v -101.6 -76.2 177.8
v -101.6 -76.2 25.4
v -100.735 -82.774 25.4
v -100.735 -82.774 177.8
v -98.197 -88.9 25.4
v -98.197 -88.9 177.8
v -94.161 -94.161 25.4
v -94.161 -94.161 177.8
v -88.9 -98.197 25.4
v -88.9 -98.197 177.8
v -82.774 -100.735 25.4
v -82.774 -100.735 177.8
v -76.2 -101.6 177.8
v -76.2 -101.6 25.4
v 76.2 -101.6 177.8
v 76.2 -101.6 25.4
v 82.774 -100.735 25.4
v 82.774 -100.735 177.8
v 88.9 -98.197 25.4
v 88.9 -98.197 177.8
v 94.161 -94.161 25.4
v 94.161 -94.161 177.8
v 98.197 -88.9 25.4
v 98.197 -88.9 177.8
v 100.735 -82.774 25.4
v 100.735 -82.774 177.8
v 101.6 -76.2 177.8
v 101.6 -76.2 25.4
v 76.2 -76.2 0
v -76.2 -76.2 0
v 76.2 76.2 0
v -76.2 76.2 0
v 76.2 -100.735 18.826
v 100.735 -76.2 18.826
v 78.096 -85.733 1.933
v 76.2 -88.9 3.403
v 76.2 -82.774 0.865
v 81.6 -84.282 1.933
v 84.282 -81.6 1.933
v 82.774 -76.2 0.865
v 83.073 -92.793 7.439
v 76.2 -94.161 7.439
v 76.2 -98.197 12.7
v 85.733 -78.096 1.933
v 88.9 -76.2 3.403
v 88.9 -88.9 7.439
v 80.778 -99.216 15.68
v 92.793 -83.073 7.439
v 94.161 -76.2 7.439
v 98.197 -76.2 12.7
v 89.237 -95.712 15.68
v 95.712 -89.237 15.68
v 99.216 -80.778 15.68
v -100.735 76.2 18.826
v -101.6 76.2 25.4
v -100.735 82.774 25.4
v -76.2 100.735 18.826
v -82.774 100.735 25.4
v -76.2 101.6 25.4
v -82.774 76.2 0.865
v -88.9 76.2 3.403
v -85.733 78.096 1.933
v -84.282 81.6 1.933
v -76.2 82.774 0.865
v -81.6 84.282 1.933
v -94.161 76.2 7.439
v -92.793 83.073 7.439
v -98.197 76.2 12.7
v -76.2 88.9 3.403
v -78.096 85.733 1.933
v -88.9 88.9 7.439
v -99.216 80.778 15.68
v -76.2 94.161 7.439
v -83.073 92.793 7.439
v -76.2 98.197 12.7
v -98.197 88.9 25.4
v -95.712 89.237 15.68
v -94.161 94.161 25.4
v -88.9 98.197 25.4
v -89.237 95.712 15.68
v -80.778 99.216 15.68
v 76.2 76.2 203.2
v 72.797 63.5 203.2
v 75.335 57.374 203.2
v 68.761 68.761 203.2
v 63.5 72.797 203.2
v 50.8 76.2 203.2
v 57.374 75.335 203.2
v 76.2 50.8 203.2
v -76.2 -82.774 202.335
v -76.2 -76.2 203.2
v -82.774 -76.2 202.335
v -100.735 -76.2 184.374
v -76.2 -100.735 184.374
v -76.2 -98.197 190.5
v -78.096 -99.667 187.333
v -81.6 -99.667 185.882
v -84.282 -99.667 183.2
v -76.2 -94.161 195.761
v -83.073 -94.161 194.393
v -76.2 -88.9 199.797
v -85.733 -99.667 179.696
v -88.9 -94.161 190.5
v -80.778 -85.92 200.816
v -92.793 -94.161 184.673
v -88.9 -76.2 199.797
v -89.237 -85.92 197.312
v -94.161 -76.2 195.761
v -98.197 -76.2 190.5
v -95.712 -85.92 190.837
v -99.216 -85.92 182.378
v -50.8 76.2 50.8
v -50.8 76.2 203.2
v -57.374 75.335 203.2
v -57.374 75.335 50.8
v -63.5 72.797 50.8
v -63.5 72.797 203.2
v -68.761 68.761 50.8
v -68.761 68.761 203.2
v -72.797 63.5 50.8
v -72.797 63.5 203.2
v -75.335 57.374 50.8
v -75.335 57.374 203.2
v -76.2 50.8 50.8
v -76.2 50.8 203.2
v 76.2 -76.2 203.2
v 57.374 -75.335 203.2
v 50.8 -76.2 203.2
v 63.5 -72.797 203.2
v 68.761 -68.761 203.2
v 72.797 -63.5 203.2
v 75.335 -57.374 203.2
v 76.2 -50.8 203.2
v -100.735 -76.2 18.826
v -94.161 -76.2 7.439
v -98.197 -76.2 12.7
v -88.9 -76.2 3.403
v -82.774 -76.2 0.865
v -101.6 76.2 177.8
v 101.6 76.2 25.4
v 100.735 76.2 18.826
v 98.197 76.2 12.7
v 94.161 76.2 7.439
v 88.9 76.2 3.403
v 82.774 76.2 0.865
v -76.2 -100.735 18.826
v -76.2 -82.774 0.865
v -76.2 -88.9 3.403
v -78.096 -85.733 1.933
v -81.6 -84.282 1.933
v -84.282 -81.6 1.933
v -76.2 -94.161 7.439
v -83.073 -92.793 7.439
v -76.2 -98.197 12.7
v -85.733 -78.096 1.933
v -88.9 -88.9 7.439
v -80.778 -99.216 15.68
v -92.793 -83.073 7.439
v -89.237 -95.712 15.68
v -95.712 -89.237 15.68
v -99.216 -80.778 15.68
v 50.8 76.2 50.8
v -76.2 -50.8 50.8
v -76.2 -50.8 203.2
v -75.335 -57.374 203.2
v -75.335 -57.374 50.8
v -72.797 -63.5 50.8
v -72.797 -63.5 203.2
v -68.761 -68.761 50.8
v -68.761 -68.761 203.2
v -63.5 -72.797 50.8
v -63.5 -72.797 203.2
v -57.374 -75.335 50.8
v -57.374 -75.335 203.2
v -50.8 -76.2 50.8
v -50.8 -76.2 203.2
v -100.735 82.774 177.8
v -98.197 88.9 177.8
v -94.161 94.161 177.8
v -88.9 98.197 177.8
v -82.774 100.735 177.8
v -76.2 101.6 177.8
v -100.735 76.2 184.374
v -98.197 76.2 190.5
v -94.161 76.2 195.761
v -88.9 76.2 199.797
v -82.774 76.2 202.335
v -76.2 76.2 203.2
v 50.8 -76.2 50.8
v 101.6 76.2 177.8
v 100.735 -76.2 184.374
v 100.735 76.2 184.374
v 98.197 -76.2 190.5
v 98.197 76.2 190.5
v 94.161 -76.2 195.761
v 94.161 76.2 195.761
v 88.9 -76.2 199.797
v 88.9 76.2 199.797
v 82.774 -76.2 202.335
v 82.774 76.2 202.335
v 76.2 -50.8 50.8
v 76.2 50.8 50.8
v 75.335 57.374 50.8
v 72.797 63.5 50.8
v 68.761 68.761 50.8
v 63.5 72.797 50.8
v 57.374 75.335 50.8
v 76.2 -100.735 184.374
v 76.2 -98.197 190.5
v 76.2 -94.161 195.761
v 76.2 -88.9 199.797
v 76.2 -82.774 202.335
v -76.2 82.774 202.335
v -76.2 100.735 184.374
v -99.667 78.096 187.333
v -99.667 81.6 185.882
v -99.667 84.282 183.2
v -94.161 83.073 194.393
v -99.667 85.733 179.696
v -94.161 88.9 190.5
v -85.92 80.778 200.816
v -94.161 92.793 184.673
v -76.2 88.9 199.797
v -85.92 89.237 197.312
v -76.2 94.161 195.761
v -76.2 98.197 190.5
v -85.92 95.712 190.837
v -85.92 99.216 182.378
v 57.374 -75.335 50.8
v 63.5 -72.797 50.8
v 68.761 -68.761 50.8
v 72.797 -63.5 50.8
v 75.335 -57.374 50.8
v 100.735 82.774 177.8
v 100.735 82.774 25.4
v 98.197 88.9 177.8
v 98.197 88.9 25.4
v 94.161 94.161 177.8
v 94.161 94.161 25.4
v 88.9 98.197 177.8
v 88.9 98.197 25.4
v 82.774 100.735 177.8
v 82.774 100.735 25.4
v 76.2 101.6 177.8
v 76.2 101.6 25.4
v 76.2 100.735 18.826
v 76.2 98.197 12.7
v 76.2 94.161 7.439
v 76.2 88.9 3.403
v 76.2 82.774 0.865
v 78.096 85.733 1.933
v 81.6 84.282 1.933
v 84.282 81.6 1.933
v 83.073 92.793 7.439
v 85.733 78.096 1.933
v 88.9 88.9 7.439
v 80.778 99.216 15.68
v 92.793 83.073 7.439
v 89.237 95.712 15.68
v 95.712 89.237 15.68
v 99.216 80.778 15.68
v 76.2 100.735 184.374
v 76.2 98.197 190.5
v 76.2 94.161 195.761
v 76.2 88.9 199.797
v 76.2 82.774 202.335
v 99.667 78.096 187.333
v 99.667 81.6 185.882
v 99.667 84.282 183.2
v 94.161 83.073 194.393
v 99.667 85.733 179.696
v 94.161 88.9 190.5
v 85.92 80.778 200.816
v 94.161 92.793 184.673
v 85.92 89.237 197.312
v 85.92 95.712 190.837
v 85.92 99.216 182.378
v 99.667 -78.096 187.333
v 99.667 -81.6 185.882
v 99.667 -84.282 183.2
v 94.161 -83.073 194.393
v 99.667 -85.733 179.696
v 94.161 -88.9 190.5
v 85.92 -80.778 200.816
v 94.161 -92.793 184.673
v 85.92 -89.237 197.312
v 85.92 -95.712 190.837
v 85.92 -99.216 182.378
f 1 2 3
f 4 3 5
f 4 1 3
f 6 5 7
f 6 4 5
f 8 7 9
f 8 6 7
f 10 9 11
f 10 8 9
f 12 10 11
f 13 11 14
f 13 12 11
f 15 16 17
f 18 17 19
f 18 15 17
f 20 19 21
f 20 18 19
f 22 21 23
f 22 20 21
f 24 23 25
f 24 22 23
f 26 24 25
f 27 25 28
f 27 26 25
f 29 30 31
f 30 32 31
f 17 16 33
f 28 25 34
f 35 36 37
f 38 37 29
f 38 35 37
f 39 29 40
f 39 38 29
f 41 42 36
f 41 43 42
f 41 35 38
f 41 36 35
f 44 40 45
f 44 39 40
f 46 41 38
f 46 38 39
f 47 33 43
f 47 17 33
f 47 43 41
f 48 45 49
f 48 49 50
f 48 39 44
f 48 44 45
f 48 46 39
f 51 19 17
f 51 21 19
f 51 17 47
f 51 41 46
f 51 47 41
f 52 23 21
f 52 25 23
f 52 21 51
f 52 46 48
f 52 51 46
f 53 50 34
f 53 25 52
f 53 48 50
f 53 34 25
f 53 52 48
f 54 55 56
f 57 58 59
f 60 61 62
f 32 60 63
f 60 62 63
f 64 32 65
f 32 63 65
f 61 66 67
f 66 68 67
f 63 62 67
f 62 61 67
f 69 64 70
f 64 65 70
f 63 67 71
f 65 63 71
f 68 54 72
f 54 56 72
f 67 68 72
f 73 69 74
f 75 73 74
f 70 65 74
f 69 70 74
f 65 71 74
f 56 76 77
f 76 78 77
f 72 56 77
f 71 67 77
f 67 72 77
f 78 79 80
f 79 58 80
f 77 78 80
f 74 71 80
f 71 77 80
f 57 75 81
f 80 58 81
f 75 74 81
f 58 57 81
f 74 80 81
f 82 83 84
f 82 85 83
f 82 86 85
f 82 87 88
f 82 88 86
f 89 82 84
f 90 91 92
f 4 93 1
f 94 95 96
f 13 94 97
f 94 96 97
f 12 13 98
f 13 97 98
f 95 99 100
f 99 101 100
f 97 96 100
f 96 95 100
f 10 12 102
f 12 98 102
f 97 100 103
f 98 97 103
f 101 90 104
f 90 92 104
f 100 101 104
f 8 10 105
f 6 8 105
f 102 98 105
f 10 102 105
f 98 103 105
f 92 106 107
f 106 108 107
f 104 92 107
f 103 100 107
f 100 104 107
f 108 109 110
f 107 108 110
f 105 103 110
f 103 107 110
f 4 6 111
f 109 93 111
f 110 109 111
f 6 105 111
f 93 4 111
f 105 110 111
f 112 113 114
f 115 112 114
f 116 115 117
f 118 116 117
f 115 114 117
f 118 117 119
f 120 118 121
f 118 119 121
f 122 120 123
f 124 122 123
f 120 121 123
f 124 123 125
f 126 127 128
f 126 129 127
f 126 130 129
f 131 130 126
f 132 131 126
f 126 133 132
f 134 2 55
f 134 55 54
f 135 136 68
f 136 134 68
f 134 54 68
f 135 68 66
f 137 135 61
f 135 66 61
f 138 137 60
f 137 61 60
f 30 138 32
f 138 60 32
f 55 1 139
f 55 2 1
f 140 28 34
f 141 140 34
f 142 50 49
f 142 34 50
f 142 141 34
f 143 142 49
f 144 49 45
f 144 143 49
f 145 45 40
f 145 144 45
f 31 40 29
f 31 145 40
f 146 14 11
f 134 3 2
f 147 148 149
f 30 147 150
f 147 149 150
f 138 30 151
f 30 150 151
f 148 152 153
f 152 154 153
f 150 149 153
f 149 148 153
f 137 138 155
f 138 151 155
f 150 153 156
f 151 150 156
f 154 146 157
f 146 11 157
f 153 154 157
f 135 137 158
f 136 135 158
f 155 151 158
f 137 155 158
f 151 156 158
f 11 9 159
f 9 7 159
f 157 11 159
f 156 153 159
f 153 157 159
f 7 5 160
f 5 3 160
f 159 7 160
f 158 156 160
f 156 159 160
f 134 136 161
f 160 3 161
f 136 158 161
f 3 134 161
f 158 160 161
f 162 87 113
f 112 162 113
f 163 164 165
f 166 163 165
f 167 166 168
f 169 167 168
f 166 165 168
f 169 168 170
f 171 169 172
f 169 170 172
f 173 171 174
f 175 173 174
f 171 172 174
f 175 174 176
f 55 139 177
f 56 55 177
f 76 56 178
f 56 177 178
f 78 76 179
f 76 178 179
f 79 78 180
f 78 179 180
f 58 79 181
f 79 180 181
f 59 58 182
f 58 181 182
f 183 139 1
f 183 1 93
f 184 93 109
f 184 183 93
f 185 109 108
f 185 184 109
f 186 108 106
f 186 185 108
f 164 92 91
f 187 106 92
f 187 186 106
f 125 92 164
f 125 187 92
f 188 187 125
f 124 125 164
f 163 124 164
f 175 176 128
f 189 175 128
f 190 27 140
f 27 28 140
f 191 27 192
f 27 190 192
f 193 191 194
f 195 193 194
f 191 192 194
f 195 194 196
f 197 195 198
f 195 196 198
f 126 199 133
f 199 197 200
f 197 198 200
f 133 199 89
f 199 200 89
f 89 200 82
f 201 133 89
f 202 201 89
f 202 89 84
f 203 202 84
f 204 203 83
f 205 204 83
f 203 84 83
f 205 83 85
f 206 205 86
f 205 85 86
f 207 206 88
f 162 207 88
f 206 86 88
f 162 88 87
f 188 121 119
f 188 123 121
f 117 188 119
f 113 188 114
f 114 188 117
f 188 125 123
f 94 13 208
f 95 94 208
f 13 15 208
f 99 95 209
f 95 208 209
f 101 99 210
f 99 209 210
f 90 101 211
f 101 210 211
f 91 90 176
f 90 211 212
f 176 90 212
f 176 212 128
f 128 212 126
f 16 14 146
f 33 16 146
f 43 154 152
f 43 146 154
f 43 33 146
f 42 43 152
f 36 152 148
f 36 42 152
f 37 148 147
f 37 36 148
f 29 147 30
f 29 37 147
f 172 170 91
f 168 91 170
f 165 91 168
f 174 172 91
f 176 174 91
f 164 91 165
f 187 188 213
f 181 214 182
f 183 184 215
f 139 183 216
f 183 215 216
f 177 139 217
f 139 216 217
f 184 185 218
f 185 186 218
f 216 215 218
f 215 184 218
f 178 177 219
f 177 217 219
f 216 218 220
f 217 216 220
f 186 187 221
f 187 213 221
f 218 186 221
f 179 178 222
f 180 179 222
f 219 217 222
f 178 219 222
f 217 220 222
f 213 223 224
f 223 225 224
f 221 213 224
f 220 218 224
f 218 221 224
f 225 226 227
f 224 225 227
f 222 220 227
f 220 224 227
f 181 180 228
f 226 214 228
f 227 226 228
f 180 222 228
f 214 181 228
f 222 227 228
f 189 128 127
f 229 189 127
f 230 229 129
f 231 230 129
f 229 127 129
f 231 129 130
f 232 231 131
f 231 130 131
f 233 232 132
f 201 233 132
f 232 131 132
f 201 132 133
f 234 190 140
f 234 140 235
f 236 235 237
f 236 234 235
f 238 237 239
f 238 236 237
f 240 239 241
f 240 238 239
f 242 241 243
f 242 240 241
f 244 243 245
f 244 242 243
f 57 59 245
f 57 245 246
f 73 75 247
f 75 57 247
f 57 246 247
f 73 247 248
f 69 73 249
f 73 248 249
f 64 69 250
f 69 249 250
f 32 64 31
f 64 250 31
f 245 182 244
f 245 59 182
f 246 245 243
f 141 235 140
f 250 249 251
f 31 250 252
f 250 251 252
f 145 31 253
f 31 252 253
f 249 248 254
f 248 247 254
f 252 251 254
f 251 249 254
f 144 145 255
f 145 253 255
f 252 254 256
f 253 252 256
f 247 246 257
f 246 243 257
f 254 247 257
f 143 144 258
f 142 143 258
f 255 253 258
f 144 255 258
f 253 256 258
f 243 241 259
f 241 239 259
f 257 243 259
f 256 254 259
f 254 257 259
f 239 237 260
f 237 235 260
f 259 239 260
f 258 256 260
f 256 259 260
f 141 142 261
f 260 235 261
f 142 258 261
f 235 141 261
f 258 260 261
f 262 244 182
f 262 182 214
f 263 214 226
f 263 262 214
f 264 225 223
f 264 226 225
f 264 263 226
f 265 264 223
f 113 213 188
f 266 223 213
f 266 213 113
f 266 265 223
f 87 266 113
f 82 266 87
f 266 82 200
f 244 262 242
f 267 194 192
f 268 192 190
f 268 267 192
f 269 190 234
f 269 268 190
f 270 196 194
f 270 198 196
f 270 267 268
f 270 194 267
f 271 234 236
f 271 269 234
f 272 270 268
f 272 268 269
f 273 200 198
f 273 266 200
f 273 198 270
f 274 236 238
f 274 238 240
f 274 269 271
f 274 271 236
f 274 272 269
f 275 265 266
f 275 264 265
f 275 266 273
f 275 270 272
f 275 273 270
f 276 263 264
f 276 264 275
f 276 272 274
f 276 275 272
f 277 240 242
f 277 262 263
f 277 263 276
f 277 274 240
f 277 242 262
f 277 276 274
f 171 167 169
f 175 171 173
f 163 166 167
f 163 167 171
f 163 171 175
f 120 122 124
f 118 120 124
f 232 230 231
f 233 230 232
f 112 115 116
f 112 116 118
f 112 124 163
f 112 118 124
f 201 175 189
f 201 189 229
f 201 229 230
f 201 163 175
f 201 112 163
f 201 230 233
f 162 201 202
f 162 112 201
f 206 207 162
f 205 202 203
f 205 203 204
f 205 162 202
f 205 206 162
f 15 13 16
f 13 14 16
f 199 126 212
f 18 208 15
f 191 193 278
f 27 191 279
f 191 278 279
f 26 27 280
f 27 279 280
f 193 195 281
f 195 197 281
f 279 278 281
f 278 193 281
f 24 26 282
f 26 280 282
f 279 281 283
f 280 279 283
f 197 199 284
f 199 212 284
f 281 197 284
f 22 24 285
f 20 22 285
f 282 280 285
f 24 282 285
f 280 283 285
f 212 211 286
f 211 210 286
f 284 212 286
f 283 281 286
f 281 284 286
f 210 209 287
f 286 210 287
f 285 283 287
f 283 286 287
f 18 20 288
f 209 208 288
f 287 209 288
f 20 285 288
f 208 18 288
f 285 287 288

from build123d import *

# Parameters (mm, degrees)
F0_W      = 203.2
F0_H      = 203.2
F1_DEPTH  = 203.2
F2_R      = 25.4
F3_W      = 50.8
F3_H      = 50.8
F4_DEPTH  = 12.7
F5_W      = 50.8
F5_H      = 50.8
F6_DEPTH  = 12.7
F12_DEPTH = 177.8


# Not quite as in the source:
# - a feature of the source that left no trace in its solid (it failed there, or was rolled back) is left out


with BuildPart() as f1:
    # F0 (on Top) → F1 (new body)
    with BuildSketch(Plane.XY):
        Rectangle(F0_W, F0_H)
    extrude(amount=F1_DEPTH)

    # F2
    f2_edges = [f1.edges().sort_by_distance(p)[0] for p in [
        (0, 101.6, 203.2),
        (-101.6, 0, 203.2),
        (0, -101.6, 203.2),
        (101.6, 0, 203.2),
        (-101.6, -101.6, 101.6),
        (101.6, -101.6, 101.6),
        (0, -101.6, 0),
        (-101.6, 101.6, 101.6),
        (-101.6, 0, 0),
        (101.6, 101.6, 101.6),
        (0, 101.6, 0),
        (101.6, 0, 0),
    ]]
    fillet(f2_edges, radius=F2_R)

    # F3 (on face) → F4 (cut)
    with BuildSketch(Plane.XY.offset(203.2)):
        with BuildLine():
            Line((50.8, 76.2), (-50.8, 76.2))
            ThreePointArc((-50.8, 76.2), (-68.7605122421, 68.7605122421), (-76.2, 50.8))
            Line((-76.2, 50.8), (-76.2, -50.8))
            ThreePointArc((-76.2, -50.8), (-68.7605122421, -68.7605122421), (-50.8, -76.2))
            Line((-50.8, -76.2), (50.8, -76.2))
            ThreePointArc((50.8, -76.2), (68.7605122421, -68.7605122421), (76.2, -50.8))
            Line((76.2, -50.8), (76.2, 50.8))
            ThreePointArc((76.2, 50.8), (68.7605122421, 68.7605122421), (50.8, 76.2))
        make_face()
        Rectangle(F3_W, F3_H, mode=Mode.SUBTRACT)
    extrude(amount=-F4_DEPTH, mode=Mode.SUBTRACT)

    # F5 (on face) → F6 (cut)
    with BuildSketch(Plane.XY.offset(203.2)):
        with BuildLine():
            Line((-25.4, 25.4), (25.4, 25.4))
            ThreePointArc((25.4, 25.4), (0, 35.9210244843), (-25.4, 25.4))
        make_face()
        with BuildLine():
            Line((-25.4, -25.4), (-25.4, 25.4))
            ThreePointArc((-25.4, 25.4), (-35.9210244843, 0), (-25.4, -25.4))
        make_face()
        with BuildLine():
            ThreePointArc((-25.4, -25.4), (0, -35.9210244843), (25.4, -25.4))
            Line((25.4, -25.4), (-25.4, -25.4))
        make_face()
        Rectangle(F5_W, F5_H)
        with BuildLine():
            ThreePointArc((25.4, -25.4), (33.1866993079, -13.7463809437), (35.9210244843, 0))
            ThreePointArc((35.9210244843, 0), (33.1866993079, 13.7463809437), (25.4, 25.4))
            Line((25.4, 25.4), (25.4, -25.4))
        make_face()
    extrude(amount=-F6_DEPTH, mode=Mode.SUBTRACT)

    # F11 (on offset) → F12 (cut)
    with BuildSketch(Plane.XY.offset(228.6)):
        with BuildLine():
            Line((50.8, 76.2), (-50.8, 76.2))
            ThreePointArc((-50.8, 76.2), (-68.7605122421, 68.7605122421), (-76.2, 50.8))
            Line((-76.2, 50.8), (-76.2, -50.8))
            ThreePointArc((-76.2, -50.8), (-68.7605122421, -68.7605122421), (-50.8, -76.2))
            Line((-50.8, -76.2), (50.8, -76.2))
            ThreePointArc((50.8, -76.2), (68.7605122421, -68.7605122421), (76.2, -50.8))
            Line((76.2, -50.8), (76.2, 50.8))
            ThreePointArc((76.2, 50.8), (68.7605122421, 68.7605122421), (50.8, 76.2))
        make_face()
    extrude(amount=-F12_DEPTH, mode=Mode.SUBTRACT)


solid = f1.part
